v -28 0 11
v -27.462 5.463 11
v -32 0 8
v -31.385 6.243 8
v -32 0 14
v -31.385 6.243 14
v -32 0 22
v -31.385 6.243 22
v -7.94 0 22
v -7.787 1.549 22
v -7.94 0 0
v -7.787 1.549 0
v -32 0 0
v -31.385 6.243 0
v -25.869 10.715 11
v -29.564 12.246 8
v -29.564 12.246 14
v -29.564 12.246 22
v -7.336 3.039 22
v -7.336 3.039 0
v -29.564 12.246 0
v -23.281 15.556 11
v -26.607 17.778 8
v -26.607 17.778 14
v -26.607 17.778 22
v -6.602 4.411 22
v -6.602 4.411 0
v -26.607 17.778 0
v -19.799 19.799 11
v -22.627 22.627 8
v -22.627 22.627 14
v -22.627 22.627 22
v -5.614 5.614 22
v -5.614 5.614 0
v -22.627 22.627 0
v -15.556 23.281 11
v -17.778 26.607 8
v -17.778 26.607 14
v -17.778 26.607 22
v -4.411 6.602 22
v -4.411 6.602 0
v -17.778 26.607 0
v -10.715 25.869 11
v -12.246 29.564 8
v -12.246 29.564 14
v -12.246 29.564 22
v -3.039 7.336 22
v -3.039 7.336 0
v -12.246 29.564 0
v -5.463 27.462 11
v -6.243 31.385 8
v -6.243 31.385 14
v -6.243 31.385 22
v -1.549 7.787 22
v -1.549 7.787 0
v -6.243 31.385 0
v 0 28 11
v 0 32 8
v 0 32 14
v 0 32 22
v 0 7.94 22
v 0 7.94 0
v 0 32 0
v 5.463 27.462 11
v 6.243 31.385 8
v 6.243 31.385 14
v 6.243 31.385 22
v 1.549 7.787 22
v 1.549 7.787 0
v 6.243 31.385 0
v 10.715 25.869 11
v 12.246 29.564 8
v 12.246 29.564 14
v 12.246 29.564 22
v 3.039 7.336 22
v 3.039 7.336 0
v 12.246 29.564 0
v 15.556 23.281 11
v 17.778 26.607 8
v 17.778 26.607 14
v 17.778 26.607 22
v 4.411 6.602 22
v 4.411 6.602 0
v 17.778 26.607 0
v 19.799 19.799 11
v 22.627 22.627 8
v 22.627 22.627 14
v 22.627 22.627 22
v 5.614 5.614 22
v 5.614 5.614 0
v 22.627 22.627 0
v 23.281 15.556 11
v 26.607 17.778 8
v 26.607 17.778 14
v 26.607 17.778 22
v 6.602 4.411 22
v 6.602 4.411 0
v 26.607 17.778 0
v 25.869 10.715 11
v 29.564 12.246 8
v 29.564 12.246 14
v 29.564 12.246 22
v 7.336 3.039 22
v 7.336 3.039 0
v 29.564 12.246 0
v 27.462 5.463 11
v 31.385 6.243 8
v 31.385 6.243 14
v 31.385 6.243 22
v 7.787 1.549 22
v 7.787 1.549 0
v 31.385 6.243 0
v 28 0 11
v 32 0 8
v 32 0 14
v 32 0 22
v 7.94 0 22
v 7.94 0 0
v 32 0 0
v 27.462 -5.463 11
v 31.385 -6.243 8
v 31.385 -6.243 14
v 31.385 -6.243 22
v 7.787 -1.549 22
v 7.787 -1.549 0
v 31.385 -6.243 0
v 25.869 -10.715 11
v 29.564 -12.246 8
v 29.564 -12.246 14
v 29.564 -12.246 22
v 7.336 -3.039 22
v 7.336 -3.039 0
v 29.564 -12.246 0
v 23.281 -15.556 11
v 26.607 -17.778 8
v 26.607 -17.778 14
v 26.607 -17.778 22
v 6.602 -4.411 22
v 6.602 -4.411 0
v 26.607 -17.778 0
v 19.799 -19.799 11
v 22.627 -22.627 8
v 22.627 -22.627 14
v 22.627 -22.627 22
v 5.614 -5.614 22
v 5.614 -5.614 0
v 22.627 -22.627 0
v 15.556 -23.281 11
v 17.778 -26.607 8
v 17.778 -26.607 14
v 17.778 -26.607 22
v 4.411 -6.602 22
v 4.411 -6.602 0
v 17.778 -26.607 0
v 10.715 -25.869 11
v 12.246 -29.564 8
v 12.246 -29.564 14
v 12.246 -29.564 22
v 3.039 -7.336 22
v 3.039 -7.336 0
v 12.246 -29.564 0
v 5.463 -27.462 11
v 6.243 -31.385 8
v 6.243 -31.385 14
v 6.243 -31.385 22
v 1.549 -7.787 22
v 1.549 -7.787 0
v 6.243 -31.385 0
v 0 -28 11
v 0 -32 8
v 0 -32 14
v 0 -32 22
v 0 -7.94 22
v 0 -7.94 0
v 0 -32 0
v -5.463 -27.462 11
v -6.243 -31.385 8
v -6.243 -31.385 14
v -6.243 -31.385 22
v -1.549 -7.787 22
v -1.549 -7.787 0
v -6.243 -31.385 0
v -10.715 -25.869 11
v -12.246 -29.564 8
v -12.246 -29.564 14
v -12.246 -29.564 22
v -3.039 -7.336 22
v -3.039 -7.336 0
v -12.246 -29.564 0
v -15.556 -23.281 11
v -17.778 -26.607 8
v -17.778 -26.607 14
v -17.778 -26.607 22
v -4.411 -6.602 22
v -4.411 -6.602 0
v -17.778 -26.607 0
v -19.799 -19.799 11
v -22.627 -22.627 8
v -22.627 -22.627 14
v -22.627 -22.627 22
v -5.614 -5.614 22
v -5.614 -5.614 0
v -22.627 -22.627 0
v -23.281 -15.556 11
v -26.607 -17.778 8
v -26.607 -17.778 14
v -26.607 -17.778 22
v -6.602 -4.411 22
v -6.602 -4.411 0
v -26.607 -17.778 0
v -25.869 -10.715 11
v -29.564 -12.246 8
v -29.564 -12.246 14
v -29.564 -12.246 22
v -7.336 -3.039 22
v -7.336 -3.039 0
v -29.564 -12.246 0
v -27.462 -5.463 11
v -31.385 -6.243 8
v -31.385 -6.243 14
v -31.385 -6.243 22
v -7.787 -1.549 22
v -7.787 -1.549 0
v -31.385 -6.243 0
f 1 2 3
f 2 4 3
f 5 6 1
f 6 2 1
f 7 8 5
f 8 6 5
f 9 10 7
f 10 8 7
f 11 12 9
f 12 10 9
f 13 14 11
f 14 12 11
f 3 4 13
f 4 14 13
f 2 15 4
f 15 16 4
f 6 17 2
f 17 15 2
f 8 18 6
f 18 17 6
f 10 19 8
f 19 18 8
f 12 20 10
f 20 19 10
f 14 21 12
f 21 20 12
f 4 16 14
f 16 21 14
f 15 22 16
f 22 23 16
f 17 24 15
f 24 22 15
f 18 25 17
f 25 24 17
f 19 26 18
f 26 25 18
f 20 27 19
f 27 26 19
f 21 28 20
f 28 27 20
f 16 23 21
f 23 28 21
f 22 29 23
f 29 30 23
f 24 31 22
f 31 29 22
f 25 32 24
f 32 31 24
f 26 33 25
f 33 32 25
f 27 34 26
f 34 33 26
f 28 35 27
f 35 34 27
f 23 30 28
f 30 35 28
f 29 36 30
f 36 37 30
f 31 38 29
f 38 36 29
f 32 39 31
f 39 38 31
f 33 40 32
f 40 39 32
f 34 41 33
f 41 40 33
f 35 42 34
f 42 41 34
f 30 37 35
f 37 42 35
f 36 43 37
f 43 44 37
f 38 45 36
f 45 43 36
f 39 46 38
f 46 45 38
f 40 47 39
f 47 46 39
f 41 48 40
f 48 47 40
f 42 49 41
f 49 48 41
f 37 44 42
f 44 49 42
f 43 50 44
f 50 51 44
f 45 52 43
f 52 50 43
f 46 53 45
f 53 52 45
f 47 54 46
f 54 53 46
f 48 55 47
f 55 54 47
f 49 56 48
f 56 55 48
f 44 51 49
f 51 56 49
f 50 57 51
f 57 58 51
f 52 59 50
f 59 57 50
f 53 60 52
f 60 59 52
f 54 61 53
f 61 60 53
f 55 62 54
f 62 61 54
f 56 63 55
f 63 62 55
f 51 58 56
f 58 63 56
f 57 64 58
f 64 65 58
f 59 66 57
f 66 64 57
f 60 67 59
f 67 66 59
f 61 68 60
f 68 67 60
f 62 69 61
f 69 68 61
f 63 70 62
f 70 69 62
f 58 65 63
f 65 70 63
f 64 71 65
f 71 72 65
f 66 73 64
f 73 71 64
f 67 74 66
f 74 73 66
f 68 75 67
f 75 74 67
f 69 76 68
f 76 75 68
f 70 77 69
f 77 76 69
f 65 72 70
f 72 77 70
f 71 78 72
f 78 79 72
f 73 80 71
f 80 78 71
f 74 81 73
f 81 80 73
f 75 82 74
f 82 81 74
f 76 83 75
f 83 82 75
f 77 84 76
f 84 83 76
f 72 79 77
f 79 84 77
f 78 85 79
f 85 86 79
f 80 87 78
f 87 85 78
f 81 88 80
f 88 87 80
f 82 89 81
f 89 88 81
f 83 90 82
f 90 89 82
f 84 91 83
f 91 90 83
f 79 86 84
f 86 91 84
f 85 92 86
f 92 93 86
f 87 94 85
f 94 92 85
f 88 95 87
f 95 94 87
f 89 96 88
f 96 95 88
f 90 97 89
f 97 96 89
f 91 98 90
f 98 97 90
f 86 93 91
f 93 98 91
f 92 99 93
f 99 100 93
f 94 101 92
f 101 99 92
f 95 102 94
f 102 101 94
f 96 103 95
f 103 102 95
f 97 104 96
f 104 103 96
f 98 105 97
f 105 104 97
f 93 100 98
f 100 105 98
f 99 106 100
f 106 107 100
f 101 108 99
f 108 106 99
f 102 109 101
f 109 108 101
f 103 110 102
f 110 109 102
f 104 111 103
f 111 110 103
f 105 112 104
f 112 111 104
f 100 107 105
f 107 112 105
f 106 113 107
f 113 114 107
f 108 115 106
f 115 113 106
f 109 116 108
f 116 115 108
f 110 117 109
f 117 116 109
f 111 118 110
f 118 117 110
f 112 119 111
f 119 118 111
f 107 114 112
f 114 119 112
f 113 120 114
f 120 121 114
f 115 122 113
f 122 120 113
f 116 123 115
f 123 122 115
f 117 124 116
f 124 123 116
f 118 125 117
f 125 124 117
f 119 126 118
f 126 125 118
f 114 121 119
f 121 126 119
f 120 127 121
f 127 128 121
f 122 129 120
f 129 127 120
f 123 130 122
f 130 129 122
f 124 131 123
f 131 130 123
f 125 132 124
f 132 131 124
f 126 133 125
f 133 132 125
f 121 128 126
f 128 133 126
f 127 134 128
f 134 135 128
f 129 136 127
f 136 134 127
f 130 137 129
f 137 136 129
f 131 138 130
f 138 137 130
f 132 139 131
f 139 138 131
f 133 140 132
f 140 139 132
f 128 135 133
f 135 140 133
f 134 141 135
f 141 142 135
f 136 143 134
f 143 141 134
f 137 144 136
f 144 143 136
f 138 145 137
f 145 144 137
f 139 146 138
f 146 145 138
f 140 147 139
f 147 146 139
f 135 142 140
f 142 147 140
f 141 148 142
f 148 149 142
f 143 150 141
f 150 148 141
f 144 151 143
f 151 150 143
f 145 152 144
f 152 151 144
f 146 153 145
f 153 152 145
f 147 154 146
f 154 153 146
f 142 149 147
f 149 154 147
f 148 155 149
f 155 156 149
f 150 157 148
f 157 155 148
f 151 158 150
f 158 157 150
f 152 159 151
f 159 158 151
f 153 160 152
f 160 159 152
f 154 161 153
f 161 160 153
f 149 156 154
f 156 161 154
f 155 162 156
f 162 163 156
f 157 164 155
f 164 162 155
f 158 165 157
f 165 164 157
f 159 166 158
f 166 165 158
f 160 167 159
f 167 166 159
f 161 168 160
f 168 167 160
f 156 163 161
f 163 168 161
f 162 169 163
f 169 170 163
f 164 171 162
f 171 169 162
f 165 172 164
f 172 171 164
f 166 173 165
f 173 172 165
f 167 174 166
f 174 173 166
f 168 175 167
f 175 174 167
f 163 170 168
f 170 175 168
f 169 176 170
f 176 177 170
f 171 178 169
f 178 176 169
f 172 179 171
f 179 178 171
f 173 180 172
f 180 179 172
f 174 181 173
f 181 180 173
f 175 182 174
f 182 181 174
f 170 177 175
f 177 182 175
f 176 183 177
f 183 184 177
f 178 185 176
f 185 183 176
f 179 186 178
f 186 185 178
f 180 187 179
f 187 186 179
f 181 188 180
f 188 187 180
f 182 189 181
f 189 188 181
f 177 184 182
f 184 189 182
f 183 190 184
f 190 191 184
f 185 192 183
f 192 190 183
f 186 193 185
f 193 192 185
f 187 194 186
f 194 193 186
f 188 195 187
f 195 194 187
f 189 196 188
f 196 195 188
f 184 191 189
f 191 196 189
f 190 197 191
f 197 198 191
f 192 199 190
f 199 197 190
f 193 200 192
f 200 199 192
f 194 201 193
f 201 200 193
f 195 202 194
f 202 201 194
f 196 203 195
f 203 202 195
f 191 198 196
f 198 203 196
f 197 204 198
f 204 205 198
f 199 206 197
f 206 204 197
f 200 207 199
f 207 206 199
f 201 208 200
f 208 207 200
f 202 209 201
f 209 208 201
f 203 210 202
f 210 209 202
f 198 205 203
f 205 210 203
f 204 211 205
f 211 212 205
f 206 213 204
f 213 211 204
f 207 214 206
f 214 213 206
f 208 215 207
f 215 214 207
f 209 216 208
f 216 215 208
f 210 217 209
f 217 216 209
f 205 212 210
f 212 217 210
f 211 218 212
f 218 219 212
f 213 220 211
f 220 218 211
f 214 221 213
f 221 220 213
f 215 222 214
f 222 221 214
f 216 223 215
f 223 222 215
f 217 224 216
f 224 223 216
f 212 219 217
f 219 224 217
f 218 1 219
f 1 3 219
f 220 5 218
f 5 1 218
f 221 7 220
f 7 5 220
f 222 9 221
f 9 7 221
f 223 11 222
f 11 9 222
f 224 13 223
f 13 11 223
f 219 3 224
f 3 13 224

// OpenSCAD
$fn = 32;

// ----------------------------------------------------------------------
// Belt roller: 64 mm barrel, 22 mm wide, bore 15.88 mm
// ----------------------------------------------------------------------

// --- parameters (mm) ---
bore_d = 15.88;           // bore
barrel_d = 64;            // barrel diameter
roller_w = 22;            // roller width
groove_w = 6;             // guide groove width
groove_d = 4;             // guide groove depth

roller_profile = [[7.94, 0], [32, 0], [32, 8], [28, 11], [32, 14], [32, 22], [7.94, 22]];

/* the profile stays clear of the axis, so the bore comes out of the revolve */
rotate_extrude() polygon(roller_profile);
